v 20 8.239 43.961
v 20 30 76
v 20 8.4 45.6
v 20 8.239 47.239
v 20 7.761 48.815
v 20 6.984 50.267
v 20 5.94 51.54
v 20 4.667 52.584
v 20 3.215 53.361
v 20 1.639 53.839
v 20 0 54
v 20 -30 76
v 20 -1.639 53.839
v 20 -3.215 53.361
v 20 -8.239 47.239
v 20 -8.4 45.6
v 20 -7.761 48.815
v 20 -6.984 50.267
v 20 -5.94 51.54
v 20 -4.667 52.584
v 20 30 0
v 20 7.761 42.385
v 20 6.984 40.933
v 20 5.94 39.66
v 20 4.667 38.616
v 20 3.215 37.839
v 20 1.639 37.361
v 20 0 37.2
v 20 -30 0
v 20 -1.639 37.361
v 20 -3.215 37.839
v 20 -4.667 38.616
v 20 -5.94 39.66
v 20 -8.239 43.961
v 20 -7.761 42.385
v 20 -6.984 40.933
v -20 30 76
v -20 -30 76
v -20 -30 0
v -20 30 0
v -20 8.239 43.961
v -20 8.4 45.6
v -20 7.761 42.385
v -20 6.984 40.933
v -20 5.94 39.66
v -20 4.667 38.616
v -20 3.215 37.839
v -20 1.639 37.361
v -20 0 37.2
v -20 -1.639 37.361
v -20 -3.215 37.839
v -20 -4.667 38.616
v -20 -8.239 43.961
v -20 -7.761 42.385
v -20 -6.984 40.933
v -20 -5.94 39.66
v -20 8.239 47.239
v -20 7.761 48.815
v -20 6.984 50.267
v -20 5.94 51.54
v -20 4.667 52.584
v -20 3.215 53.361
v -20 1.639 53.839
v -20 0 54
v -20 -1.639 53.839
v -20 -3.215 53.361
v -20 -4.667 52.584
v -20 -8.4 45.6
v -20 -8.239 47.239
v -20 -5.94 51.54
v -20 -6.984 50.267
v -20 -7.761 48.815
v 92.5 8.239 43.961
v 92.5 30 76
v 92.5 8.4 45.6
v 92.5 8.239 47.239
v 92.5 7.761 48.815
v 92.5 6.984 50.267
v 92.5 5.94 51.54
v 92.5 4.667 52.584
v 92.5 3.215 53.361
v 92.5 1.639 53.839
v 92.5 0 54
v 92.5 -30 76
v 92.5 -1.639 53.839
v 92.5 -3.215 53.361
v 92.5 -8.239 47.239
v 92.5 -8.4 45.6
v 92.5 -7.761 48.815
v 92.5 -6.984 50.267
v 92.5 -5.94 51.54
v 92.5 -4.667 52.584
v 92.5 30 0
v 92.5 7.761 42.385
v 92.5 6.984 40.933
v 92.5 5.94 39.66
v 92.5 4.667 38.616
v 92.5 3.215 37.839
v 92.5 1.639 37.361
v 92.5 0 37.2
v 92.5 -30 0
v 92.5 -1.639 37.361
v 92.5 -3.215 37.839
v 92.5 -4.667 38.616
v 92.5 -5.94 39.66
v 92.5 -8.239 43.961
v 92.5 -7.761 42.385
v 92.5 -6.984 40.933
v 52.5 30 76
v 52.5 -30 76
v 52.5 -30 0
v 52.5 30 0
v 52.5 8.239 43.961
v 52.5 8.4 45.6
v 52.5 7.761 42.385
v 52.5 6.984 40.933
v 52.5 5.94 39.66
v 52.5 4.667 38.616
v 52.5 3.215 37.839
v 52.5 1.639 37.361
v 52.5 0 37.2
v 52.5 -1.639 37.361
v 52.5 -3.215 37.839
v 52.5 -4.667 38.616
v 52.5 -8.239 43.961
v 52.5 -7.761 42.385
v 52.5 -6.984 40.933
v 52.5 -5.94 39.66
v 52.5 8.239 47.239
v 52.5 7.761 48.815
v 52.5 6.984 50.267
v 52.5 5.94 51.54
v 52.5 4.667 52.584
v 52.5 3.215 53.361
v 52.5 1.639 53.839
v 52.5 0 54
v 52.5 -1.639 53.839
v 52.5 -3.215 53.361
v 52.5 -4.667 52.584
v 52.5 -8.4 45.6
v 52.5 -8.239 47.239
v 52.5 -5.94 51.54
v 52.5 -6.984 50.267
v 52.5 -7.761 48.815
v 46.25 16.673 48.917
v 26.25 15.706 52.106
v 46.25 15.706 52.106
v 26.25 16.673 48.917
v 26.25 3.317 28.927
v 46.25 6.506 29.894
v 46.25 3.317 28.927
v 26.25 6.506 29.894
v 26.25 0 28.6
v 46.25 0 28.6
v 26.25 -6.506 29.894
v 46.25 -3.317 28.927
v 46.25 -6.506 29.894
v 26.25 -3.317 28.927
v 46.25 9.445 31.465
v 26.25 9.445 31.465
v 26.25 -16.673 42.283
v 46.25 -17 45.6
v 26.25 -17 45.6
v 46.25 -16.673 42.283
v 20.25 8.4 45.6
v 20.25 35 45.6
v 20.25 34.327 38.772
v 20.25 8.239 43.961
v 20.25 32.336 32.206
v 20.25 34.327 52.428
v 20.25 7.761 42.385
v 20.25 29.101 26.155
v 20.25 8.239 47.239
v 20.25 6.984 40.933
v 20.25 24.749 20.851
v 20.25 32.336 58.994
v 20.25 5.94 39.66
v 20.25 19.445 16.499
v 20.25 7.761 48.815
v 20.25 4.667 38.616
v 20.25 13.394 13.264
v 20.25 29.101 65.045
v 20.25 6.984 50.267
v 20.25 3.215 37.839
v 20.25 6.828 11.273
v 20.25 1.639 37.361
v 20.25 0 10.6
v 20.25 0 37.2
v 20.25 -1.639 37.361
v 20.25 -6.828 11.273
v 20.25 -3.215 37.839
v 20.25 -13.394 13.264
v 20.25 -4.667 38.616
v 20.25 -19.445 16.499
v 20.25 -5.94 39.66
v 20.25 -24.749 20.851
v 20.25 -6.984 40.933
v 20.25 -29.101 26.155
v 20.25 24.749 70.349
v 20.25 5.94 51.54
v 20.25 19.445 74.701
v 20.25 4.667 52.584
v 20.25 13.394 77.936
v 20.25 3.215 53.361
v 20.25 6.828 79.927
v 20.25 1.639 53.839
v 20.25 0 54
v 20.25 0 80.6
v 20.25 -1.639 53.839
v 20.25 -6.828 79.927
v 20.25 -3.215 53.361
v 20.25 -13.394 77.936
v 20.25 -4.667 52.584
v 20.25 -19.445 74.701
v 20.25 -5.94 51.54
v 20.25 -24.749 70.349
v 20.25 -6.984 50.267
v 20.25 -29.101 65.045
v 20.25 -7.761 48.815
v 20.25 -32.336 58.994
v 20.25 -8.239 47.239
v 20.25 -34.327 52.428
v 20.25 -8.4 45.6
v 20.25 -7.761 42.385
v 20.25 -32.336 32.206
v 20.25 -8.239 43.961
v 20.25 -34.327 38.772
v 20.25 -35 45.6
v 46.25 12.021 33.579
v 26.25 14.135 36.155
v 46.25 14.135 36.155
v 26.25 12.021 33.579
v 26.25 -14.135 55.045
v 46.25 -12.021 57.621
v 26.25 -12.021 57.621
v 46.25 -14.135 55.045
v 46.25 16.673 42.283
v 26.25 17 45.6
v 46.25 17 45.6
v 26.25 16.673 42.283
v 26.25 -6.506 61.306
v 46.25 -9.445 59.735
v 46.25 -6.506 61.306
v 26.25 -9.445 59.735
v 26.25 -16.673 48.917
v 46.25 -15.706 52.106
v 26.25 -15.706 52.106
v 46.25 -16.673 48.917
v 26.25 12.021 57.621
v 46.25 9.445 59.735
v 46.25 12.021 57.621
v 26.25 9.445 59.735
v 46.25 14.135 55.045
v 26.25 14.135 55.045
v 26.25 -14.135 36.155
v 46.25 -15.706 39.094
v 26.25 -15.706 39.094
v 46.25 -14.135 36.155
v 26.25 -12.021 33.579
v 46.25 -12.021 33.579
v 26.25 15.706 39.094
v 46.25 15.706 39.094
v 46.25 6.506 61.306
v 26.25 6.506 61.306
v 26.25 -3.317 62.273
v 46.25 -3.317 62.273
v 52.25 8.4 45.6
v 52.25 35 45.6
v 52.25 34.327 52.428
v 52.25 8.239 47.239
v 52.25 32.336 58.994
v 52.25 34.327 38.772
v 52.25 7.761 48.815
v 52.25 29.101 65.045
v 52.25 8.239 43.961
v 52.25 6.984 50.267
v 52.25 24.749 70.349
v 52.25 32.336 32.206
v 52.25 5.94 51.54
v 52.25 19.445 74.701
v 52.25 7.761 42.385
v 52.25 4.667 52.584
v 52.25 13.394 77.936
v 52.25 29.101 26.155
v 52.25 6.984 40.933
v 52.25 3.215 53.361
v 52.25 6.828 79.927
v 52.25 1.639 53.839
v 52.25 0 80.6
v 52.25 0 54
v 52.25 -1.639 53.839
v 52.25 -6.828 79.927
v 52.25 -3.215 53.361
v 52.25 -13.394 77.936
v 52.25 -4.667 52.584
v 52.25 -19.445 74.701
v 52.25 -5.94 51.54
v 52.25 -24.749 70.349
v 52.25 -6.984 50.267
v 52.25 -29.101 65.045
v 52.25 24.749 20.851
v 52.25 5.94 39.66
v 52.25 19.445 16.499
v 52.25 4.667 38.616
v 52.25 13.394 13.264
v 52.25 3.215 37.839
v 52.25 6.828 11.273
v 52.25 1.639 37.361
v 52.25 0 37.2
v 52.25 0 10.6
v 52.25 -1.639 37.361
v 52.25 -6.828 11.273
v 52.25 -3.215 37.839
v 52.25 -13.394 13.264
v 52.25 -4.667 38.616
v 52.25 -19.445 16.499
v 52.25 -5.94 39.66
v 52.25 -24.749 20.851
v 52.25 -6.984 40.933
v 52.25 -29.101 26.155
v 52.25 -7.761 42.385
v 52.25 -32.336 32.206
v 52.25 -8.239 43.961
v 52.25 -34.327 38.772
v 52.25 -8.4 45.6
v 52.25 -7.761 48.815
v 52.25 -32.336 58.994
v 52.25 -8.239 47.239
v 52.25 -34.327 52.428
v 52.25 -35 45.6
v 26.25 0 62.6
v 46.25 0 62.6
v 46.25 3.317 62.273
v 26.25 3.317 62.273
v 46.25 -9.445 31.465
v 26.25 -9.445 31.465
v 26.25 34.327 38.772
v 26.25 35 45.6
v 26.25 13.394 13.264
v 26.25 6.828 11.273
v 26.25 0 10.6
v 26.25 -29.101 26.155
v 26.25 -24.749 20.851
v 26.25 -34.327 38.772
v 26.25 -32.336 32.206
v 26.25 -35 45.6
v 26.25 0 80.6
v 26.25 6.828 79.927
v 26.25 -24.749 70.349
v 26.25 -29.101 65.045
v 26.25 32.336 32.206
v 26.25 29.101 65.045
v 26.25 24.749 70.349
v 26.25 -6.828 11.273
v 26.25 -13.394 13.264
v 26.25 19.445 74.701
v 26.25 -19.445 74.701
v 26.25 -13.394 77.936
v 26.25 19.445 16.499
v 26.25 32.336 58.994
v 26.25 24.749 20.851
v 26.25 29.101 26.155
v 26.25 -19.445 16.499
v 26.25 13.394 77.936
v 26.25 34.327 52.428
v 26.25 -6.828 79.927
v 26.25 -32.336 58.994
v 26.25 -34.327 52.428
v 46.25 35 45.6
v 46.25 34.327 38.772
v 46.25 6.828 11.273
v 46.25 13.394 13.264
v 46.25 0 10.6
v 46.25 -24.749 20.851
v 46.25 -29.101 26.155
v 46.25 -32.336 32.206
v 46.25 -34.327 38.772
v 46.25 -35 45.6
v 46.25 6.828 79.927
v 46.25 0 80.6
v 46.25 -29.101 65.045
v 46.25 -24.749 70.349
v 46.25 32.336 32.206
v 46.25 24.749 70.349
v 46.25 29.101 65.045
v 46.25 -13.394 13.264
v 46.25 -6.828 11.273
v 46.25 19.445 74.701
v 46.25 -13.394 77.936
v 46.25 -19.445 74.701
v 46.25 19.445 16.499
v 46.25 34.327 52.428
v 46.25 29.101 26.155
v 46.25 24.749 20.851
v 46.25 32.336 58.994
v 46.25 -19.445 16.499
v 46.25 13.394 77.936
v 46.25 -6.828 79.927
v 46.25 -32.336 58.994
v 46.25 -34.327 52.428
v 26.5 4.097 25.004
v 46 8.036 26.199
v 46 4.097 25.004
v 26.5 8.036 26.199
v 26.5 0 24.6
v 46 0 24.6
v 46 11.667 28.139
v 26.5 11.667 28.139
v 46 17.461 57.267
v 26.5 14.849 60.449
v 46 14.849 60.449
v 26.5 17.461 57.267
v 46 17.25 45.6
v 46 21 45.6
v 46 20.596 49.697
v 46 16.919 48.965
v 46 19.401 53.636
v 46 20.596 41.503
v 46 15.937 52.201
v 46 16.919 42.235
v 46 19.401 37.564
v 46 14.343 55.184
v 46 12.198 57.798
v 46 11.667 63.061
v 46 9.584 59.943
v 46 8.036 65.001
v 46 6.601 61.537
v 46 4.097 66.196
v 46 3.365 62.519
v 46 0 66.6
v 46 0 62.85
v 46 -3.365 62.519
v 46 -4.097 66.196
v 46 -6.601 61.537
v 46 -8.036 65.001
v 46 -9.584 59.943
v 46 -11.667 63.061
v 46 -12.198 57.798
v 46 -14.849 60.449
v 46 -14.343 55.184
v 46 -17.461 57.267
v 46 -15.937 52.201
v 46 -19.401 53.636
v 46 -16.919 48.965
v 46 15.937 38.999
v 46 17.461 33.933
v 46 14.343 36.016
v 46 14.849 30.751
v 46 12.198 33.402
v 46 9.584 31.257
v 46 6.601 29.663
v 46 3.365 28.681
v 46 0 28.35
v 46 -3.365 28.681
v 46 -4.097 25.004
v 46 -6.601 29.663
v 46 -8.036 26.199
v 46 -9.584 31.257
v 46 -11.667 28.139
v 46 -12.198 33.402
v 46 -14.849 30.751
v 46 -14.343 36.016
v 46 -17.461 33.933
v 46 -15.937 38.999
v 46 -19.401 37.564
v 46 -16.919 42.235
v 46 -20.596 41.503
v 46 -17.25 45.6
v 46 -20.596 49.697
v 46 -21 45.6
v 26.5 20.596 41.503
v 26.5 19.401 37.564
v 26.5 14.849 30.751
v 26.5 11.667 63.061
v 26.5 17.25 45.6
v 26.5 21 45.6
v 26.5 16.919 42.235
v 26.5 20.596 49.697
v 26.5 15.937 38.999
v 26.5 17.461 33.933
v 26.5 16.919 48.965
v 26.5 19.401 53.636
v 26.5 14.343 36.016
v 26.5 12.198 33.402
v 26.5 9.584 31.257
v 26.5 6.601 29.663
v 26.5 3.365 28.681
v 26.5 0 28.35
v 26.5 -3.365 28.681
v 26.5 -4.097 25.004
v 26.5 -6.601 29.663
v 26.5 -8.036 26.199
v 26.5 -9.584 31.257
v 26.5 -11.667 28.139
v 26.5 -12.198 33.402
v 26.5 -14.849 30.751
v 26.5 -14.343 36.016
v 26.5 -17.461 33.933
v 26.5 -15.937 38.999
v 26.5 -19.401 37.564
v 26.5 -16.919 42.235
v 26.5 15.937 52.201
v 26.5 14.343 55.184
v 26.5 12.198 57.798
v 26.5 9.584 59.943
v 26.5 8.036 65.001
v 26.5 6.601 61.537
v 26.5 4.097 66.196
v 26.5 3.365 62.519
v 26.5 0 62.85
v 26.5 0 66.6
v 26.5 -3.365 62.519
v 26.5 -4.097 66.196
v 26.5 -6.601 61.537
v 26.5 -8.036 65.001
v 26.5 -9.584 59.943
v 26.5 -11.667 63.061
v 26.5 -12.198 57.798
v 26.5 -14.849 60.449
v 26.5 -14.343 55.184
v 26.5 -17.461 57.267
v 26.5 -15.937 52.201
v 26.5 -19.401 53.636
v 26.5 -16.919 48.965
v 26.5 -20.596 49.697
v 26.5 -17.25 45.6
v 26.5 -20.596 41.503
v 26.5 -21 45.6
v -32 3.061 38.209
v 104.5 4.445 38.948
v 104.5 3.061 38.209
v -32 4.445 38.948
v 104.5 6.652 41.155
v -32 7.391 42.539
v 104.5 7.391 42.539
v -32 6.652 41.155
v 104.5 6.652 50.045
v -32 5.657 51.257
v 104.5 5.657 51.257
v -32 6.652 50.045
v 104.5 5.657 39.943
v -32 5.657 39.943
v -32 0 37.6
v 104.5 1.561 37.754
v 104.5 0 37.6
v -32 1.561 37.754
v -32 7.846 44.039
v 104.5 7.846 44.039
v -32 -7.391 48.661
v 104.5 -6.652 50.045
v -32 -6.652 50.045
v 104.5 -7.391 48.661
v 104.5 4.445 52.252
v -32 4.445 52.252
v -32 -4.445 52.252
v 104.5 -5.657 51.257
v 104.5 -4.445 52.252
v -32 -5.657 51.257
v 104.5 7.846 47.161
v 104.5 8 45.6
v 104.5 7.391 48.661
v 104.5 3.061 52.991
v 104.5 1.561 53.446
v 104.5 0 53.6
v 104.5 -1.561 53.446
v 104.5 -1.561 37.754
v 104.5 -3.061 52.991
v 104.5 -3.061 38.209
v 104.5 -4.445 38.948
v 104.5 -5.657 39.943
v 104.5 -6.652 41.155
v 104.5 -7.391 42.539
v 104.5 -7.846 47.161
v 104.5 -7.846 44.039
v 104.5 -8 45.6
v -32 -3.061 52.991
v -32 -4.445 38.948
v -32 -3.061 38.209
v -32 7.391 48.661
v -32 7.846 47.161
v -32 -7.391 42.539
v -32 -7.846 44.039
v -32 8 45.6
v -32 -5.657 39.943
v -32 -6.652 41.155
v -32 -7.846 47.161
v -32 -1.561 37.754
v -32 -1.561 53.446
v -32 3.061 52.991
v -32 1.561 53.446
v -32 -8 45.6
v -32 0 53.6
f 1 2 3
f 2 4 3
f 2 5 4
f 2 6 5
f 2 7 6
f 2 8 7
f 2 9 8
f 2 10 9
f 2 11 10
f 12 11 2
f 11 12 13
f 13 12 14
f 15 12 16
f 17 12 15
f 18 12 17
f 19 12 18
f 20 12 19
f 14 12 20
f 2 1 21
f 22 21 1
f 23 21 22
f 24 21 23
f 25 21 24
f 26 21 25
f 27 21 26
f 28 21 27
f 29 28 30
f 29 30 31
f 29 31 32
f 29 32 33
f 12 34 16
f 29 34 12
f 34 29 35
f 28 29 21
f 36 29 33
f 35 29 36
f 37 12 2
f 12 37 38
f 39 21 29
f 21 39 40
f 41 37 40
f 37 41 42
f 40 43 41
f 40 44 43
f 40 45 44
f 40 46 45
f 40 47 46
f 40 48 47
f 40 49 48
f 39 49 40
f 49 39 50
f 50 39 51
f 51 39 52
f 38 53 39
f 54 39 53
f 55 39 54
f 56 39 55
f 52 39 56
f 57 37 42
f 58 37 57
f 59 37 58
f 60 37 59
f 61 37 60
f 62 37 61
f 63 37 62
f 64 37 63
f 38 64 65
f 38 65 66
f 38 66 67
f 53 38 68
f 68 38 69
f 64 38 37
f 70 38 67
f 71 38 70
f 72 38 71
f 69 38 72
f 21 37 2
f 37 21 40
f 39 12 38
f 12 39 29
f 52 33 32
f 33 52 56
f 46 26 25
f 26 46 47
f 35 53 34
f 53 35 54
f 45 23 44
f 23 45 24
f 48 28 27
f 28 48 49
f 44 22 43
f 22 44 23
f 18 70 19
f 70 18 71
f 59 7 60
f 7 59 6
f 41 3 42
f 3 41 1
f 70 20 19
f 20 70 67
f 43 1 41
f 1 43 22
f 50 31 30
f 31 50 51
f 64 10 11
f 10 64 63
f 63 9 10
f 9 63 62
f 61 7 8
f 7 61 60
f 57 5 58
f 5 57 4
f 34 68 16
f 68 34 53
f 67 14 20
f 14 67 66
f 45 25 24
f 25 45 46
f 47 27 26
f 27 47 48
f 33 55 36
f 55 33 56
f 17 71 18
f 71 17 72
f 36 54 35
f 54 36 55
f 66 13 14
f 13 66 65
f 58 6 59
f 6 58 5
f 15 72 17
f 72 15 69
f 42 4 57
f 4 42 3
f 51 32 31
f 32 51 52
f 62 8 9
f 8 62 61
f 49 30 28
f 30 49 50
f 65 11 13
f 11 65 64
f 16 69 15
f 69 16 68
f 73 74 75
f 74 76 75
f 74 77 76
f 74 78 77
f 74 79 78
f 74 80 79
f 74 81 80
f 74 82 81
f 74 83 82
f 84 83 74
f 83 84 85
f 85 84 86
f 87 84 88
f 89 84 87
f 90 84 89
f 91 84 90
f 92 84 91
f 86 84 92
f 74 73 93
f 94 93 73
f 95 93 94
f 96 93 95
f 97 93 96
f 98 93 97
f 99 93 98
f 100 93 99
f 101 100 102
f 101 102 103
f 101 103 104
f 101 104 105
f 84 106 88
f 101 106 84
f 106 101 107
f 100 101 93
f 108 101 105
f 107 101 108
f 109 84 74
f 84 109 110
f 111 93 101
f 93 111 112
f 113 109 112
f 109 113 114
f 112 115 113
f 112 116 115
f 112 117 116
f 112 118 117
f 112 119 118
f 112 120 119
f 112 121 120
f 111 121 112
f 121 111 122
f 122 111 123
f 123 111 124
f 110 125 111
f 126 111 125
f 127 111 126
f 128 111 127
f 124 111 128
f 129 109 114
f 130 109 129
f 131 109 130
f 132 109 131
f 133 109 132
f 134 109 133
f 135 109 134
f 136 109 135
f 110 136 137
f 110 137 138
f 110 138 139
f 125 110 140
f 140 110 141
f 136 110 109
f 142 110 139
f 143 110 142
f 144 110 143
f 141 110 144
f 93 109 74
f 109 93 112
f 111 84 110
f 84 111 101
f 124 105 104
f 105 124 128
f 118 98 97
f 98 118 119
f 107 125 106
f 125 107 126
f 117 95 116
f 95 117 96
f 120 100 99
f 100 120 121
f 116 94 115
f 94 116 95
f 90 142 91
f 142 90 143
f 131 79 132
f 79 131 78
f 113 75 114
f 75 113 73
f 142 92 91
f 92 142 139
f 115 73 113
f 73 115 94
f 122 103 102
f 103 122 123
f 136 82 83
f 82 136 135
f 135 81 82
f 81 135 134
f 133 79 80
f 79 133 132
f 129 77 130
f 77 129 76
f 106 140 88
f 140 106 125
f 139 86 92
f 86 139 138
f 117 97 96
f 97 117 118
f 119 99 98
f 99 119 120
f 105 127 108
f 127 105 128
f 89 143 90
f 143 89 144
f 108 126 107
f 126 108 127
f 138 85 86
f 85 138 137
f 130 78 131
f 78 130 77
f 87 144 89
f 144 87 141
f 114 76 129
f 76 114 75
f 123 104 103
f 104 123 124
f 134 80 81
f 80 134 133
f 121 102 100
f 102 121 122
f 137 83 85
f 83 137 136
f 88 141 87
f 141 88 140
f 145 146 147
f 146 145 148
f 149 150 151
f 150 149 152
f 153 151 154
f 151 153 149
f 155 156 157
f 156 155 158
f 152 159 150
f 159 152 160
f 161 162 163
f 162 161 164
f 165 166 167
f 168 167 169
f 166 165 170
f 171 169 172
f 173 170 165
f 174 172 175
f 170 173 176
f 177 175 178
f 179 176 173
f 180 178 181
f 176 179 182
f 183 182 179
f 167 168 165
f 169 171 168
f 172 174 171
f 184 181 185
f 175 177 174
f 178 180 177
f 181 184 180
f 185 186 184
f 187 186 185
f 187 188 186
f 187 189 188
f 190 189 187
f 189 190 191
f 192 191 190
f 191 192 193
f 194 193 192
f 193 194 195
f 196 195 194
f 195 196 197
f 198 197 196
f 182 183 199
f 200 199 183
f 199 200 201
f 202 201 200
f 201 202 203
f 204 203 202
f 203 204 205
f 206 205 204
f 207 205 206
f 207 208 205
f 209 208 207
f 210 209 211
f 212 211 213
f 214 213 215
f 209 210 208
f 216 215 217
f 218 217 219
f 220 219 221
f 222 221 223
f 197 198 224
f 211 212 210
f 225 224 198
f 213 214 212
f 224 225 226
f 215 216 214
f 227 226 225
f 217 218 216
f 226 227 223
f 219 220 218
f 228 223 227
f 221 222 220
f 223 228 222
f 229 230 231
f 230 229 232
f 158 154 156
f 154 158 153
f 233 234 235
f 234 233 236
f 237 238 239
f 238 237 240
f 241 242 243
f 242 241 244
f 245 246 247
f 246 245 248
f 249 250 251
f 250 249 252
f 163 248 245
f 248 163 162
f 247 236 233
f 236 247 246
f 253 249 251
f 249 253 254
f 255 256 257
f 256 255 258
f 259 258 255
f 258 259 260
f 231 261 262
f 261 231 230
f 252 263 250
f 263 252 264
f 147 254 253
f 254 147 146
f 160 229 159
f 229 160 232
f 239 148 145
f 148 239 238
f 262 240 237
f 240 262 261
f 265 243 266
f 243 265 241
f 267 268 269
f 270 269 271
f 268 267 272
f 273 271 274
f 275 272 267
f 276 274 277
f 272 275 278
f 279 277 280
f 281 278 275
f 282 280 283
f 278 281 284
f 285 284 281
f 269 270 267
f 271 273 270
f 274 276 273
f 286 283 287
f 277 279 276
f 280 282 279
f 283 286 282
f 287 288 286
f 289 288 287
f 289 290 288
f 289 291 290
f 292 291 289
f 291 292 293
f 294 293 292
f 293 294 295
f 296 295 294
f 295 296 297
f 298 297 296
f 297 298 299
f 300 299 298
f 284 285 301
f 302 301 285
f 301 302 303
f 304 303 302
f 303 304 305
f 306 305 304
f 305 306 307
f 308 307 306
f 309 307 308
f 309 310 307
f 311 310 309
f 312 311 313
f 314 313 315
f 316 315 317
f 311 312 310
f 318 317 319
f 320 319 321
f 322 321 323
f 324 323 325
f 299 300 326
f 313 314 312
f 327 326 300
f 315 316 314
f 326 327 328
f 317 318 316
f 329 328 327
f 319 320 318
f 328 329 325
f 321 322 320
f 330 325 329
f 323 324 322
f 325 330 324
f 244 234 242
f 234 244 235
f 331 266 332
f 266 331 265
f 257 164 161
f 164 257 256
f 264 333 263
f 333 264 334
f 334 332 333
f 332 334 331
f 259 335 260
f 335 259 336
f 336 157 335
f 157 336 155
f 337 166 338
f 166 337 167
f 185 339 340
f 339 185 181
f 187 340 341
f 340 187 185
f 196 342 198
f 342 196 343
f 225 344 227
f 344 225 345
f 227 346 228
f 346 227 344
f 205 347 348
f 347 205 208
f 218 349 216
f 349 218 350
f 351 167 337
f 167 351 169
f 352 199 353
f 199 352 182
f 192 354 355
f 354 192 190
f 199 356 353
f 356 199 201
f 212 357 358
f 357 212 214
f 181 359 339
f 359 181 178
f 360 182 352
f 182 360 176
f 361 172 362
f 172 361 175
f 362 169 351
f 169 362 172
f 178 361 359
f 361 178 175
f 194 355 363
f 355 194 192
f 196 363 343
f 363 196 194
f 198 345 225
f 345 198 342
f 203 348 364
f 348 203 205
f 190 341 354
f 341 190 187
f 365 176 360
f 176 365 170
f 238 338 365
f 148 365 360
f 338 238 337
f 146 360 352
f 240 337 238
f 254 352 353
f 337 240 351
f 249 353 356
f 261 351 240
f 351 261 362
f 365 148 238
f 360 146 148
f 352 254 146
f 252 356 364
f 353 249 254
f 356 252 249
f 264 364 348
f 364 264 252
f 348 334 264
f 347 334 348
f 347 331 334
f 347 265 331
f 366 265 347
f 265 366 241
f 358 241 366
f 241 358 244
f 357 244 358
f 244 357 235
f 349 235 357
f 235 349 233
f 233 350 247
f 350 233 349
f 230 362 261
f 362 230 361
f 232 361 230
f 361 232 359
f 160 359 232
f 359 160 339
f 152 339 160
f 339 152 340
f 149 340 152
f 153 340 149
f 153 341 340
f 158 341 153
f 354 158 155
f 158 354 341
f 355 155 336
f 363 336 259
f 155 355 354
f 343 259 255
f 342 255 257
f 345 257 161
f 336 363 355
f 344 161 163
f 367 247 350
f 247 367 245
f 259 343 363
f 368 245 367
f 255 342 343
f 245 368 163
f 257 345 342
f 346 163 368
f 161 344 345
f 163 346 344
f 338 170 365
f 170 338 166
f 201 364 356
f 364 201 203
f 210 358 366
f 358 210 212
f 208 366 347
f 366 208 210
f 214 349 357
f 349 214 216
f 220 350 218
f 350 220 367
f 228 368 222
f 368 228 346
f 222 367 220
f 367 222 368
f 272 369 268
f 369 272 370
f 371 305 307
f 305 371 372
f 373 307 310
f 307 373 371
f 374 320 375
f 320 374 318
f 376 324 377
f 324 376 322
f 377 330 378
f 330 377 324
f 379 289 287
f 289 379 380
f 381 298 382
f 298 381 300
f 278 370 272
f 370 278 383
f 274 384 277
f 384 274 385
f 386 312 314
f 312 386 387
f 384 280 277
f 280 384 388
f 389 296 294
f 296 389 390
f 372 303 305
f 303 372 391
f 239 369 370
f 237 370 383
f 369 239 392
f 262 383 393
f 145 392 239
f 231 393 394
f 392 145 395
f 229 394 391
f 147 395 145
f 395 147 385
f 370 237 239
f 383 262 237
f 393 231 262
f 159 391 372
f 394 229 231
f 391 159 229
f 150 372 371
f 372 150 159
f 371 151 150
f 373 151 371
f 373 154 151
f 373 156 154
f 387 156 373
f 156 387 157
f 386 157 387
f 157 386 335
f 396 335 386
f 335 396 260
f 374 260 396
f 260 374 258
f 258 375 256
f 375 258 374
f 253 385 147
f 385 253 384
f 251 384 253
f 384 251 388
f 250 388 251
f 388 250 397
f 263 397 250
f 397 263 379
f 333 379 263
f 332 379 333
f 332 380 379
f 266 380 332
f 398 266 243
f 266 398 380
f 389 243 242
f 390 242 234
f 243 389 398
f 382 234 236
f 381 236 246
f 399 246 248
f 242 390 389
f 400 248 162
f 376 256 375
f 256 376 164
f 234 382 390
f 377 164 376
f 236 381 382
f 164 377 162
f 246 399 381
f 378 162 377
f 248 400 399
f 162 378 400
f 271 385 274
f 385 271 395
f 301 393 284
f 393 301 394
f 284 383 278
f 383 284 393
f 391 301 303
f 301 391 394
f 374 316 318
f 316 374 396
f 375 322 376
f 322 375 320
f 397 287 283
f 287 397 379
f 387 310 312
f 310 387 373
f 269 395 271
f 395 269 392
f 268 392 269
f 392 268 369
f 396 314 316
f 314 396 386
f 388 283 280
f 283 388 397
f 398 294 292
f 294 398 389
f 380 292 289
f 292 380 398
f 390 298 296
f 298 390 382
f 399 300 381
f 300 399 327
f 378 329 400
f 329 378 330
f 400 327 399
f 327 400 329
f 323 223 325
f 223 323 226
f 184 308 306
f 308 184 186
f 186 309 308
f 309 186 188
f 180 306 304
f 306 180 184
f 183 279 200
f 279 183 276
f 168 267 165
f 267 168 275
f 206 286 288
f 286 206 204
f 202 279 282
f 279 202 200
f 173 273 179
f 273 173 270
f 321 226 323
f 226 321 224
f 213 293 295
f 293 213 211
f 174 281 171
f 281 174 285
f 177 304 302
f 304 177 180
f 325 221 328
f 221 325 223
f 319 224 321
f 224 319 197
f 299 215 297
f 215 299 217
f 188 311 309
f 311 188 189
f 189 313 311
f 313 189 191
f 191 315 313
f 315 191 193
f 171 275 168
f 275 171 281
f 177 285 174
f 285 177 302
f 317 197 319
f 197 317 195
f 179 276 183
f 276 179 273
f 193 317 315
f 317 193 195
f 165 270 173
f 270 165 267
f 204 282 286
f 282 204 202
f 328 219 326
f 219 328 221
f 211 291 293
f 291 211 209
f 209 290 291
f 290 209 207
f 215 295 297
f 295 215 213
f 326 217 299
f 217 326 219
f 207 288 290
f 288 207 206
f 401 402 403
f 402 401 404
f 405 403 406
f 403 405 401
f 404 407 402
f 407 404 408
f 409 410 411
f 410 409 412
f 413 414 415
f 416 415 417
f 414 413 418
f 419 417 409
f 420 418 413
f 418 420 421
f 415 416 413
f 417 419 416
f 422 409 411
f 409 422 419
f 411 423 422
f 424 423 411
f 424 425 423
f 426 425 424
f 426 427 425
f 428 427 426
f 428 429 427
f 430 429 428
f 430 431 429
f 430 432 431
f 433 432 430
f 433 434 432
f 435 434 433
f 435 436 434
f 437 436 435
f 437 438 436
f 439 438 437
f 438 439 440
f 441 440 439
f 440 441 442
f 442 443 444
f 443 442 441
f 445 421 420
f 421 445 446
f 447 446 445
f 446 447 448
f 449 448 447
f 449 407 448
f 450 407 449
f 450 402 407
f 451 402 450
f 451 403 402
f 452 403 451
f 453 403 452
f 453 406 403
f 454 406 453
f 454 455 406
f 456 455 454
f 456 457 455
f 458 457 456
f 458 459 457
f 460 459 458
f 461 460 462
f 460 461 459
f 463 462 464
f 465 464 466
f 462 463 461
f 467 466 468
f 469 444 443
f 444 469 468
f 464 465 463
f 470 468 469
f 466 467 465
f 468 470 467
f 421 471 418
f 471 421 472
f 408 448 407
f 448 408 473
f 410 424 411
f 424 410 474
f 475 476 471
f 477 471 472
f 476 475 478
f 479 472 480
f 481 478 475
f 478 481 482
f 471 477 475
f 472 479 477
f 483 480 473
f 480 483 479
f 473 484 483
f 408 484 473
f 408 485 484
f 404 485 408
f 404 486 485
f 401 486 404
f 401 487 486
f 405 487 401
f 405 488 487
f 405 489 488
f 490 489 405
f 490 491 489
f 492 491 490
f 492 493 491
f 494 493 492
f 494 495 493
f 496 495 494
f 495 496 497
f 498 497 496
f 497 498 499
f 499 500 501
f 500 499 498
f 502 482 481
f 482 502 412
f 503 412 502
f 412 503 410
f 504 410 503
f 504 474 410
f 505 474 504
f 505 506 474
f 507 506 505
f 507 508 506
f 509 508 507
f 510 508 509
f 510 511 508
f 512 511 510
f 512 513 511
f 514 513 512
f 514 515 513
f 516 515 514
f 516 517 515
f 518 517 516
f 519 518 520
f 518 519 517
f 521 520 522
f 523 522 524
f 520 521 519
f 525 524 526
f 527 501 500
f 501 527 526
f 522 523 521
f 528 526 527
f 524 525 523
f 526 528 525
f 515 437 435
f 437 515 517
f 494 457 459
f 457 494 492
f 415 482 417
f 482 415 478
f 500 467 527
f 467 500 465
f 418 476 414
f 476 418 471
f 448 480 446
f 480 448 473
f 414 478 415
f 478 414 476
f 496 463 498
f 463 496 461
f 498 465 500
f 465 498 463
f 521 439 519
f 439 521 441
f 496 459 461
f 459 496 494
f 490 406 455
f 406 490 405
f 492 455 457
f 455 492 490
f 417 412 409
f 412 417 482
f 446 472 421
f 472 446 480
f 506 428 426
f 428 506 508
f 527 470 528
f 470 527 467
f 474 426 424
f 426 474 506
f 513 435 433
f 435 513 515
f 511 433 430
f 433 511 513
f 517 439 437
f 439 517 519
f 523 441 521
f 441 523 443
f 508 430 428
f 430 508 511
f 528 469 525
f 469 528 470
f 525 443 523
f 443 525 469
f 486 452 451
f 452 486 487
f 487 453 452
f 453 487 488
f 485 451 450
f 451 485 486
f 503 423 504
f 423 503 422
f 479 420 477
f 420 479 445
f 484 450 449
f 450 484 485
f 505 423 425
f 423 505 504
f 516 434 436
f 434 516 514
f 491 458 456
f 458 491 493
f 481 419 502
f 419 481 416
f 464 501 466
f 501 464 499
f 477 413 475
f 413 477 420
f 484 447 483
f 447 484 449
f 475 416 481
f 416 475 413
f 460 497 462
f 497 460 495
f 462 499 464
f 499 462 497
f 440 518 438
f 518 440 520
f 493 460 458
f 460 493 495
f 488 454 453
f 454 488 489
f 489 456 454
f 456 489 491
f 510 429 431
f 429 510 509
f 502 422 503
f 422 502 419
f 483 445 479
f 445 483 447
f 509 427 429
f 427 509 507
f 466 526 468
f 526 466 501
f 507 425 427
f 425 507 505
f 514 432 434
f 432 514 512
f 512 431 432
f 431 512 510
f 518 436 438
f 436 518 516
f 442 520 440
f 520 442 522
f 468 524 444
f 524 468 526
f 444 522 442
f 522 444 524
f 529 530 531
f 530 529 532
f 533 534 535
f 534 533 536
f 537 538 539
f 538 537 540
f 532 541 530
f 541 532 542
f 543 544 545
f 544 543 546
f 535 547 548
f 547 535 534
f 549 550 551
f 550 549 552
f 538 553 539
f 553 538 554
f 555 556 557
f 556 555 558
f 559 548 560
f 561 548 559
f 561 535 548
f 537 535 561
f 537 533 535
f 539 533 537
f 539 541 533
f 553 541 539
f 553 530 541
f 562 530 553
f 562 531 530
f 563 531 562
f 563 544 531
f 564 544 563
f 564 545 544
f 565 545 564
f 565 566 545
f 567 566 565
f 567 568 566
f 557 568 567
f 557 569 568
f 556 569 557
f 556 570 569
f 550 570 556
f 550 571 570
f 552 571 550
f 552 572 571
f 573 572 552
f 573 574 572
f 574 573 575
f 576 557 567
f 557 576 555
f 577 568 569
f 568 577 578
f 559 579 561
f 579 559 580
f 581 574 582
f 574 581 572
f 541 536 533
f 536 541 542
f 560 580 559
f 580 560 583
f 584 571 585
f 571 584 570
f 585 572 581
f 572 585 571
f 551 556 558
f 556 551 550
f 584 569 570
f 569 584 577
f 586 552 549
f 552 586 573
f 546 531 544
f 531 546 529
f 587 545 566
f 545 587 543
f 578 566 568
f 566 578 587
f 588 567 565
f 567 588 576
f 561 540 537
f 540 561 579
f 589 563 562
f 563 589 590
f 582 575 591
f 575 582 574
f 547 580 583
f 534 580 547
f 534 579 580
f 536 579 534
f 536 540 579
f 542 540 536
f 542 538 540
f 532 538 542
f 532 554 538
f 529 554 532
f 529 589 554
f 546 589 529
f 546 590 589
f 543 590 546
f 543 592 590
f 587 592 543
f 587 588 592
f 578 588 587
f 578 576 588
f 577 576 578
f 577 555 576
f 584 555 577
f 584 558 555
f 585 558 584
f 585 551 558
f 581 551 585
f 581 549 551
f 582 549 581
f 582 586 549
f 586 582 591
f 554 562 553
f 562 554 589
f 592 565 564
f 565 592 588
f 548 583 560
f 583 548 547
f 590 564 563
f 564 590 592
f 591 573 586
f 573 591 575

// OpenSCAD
$fn = 32;

// ------------------------------------------------------------------------
// Pulley assembly: d70 pulley with a belt, shaft d16
// Every part is its own module, assembly() places them once.
// ------------------------------------------------------------------------

// --- part 1 ---
module support1() {
  difference() {
    translate([-20, -30, 0]) cube([40, 60, 76]);
    translate([0, 0, 45.6]) rotate([0, 90, 0]) cylinder(h = 42, d = 16.8, center = true);
  }
}

// --- part 2 ---
module support2() {
  difference() {
    translate([-20, -30, 0]) cube([40, 60, 76]);
    translate([0, 0, 45.6]) rotate([0, 90, 0]) cylinder(h = 42, d = 16.8, center = true);
  }
}

// --- part 3 ---
module shaft() {
  translate([0, 0, -68.25]) cylinder(h = 136.5, d = 16);
}

// --- part 4 ---
module pulley() {
  difference() {
    union() {
      cylinder(h = 32, d = 34);
      cylinder(h = 6, d = 70);
      translate([0, 0, 26]) cylinder(h = 6, d = 70);
    }
    translate([0, 0, -1]) cylinder(h = 34, d = 16.8);
  }
}

// --- part 5 ---
module belt() {
  difference() {
      translate([0, 0, 0]) cylinder(h = 19.5, d = 42);
      translate([0, 0, -1]) cylinder(h = 21.5, d = 34.5);
    }
}

// --- assembly ---
module assembly() {
  translate([0, 0, 0]) rotate([0, 0, 0]) support1();
  translate([72.5, 0, 0]) rotate([0, 0, 0]) support2();
  translate([36.25, 0, 45.6]) rotate([0, 90, 0]) shaft();
  translate([20.25, 0, 45.6]) rotate([0, 90, 0]) pulley();
  translate([26.5, 0, 45.6]) rotate([0, 90, 0]) belt();
}

assembly();
